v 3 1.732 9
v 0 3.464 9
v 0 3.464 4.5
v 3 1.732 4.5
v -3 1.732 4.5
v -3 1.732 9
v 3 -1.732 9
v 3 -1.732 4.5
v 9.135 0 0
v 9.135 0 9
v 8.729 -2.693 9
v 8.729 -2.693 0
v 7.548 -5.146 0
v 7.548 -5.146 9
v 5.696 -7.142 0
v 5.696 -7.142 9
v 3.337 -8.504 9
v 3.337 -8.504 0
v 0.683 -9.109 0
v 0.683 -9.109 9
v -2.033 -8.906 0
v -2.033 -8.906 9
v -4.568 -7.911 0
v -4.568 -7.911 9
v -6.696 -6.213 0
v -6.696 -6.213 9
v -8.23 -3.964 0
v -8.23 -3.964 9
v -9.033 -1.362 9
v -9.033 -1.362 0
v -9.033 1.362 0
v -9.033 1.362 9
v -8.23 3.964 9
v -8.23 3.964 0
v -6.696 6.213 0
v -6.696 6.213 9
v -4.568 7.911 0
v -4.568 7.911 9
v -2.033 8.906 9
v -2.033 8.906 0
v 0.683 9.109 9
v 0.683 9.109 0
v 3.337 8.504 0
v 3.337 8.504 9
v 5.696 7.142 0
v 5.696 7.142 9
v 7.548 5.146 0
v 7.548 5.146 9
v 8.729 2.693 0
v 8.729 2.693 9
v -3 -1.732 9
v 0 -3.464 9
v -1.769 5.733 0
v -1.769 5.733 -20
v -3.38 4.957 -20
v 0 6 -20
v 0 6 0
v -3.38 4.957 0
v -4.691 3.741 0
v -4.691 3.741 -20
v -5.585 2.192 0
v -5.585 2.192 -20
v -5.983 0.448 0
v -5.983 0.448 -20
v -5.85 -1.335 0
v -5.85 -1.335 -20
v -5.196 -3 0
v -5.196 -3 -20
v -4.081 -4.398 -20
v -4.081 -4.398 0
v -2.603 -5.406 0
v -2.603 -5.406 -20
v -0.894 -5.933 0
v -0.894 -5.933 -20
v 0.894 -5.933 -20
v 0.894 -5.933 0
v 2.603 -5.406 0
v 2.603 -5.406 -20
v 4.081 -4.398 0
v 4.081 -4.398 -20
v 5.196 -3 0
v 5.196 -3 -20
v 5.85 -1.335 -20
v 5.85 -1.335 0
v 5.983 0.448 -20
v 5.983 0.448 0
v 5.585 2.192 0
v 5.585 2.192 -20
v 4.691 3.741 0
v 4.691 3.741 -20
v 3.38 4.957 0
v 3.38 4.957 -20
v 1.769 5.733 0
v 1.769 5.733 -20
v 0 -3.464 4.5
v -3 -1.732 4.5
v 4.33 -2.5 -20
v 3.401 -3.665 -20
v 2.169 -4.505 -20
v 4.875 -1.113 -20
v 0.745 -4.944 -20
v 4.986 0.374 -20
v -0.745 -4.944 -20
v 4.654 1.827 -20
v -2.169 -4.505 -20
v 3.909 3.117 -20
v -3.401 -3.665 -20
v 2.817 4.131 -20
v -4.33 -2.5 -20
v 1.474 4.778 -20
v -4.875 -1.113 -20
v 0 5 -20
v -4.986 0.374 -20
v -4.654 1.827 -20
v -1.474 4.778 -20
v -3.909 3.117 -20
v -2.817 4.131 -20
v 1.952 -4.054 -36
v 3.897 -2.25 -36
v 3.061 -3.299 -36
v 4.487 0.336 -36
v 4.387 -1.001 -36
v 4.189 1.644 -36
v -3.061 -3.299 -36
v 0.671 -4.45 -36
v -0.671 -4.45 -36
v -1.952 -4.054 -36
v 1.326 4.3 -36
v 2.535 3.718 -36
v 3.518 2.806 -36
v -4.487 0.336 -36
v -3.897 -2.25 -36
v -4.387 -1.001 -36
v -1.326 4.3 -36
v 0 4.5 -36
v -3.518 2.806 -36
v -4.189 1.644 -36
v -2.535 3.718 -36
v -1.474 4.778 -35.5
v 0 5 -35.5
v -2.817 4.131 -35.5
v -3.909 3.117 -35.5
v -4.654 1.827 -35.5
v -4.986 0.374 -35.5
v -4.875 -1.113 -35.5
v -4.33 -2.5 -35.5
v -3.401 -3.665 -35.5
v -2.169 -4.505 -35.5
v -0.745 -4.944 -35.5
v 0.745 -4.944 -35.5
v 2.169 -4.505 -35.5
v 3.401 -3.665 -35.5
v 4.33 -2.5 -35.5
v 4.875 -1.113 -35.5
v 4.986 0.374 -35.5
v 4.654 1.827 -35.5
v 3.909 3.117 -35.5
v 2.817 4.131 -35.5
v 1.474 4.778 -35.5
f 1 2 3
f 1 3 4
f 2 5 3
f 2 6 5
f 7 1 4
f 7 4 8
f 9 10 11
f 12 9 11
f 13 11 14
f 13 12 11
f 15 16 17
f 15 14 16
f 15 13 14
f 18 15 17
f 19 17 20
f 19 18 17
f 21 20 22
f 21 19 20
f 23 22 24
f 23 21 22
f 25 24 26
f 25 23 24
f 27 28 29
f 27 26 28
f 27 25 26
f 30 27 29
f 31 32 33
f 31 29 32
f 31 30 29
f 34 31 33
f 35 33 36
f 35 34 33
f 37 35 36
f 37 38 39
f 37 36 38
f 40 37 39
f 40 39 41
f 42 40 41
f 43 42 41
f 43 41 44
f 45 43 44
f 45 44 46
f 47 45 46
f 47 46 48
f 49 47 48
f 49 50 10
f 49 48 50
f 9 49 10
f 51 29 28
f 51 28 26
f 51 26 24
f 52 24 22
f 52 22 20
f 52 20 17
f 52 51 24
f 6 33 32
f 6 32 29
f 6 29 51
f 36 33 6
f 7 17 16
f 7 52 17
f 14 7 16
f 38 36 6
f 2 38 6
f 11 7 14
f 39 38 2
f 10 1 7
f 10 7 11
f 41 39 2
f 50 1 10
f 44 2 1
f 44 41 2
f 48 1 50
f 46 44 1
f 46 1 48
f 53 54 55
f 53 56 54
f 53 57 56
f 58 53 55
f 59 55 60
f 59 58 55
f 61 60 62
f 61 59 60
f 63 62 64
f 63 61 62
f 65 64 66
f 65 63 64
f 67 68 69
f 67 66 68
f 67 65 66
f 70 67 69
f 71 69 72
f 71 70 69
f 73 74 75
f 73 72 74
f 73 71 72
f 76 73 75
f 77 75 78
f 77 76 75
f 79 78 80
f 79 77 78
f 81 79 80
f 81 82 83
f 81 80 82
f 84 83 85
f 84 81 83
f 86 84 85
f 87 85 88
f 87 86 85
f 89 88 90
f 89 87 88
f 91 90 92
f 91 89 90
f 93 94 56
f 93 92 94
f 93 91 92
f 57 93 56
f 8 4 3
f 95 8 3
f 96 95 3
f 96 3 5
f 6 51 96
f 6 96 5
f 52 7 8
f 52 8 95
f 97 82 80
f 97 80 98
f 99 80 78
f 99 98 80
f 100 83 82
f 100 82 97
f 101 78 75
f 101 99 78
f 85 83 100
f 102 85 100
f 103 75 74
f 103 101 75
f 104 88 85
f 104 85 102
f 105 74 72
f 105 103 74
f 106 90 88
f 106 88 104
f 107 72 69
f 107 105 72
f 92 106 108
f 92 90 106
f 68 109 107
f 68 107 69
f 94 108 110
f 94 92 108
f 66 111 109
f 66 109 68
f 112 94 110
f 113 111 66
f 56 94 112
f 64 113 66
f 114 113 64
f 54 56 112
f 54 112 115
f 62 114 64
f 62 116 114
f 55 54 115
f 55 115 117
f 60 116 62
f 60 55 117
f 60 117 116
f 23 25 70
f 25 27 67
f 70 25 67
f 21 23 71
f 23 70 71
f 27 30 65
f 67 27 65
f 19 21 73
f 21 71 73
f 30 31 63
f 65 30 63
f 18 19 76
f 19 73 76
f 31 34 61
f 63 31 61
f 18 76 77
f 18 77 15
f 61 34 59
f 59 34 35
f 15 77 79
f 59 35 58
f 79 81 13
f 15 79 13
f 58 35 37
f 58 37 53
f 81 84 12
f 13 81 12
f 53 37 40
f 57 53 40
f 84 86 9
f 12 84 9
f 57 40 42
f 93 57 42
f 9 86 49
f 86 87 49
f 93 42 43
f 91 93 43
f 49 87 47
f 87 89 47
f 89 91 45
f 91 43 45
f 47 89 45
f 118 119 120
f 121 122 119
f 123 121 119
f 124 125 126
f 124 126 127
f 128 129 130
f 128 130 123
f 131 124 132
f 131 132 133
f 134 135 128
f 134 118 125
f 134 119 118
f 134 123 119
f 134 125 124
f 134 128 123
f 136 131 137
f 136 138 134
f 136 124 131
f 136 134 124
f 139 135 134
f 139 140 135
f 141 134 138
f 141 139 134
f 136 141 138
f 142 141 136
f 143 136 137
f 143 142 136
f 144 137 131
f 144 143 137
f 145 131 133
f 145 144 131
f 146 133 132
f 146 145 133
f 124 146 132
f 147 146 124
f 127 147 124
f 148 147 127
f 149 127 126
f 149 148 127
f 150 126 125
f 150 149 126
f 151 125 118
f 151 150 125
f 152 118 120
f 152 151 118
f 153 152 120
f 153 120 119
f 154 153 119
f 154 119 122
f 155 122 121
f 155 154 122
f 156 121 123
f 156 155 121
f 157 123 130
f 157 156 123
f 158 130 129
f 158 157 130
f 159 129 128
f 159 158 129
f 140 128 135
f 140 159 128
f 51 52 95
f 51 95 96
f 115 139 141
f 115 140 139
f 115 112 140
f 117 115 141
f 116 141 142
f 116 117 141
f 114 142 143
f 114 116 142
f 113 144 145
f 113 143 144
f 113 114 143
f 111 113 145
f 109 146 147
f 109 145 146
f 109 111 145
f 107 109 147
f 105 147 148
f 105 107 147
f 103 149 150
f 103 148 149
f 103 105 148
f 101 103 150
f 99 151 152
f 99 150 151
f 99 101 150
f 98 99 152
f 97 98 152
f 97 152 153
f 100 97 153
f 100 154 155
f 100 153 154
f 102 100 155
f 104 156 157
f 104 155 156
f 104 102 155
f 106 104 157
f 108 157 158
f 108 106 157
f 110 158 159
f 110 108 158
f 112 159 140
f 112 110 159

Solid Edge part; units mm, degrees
sketch "Sketch1" plane through (0, 0, 0) normal (0, 0, 1) x (1, 0, 0)
  circle A0 centre (0, 0) radius 9.135
  dimension "D1" = 18.27
extrude "Protrusion1" add sketch "Sketch1" along normal blind 9
sketch "Sketch2" plane through (0, 0, 9) normal (0, 0, 1) x (1, 0, 0)
  line L0 (0, -3.4641) -> (-3, -1.7321)
  line L1 (-3, -1.7321) -> (-3, 1.7321)
  line L2 (-3, 1.7321) -> (0, 3.4641)
  line L3 (0, 3.4641) -> (3, 1.7321)
  line L4 (3, 1.7321) -> (3, -1.7321)
  line L5 (3, -1.7321) -> (0, -3.4641)
  dimension "D1" = 6
extrude "Cutout1" cut sketch "Sketch2" against normal blind 4.5
sketch "Sketch3" plane through (0, 0, 0) normal (0, 0, -1) x (0, 1, 0)
  circle A0 centre (0, 0) radius 6
  dimension "D1" = 12
extrude "Protrusion2" add sketch "Sketch3" along normal blind 20
sketch "Sketch4" plane through (0, 0, -20) normal (0, 0, -1) x (0, 1, 0)
  circle A0 centre (0, 0) radius 5
  dimension "D1" = 10
extrude "Protrusion3" add sketch "Sketch4" along normal blind 16
chamfer "Chamfer1" distance 0.5 angle 45 1 edges at (0, -5, -36)
properties part number "113690"
